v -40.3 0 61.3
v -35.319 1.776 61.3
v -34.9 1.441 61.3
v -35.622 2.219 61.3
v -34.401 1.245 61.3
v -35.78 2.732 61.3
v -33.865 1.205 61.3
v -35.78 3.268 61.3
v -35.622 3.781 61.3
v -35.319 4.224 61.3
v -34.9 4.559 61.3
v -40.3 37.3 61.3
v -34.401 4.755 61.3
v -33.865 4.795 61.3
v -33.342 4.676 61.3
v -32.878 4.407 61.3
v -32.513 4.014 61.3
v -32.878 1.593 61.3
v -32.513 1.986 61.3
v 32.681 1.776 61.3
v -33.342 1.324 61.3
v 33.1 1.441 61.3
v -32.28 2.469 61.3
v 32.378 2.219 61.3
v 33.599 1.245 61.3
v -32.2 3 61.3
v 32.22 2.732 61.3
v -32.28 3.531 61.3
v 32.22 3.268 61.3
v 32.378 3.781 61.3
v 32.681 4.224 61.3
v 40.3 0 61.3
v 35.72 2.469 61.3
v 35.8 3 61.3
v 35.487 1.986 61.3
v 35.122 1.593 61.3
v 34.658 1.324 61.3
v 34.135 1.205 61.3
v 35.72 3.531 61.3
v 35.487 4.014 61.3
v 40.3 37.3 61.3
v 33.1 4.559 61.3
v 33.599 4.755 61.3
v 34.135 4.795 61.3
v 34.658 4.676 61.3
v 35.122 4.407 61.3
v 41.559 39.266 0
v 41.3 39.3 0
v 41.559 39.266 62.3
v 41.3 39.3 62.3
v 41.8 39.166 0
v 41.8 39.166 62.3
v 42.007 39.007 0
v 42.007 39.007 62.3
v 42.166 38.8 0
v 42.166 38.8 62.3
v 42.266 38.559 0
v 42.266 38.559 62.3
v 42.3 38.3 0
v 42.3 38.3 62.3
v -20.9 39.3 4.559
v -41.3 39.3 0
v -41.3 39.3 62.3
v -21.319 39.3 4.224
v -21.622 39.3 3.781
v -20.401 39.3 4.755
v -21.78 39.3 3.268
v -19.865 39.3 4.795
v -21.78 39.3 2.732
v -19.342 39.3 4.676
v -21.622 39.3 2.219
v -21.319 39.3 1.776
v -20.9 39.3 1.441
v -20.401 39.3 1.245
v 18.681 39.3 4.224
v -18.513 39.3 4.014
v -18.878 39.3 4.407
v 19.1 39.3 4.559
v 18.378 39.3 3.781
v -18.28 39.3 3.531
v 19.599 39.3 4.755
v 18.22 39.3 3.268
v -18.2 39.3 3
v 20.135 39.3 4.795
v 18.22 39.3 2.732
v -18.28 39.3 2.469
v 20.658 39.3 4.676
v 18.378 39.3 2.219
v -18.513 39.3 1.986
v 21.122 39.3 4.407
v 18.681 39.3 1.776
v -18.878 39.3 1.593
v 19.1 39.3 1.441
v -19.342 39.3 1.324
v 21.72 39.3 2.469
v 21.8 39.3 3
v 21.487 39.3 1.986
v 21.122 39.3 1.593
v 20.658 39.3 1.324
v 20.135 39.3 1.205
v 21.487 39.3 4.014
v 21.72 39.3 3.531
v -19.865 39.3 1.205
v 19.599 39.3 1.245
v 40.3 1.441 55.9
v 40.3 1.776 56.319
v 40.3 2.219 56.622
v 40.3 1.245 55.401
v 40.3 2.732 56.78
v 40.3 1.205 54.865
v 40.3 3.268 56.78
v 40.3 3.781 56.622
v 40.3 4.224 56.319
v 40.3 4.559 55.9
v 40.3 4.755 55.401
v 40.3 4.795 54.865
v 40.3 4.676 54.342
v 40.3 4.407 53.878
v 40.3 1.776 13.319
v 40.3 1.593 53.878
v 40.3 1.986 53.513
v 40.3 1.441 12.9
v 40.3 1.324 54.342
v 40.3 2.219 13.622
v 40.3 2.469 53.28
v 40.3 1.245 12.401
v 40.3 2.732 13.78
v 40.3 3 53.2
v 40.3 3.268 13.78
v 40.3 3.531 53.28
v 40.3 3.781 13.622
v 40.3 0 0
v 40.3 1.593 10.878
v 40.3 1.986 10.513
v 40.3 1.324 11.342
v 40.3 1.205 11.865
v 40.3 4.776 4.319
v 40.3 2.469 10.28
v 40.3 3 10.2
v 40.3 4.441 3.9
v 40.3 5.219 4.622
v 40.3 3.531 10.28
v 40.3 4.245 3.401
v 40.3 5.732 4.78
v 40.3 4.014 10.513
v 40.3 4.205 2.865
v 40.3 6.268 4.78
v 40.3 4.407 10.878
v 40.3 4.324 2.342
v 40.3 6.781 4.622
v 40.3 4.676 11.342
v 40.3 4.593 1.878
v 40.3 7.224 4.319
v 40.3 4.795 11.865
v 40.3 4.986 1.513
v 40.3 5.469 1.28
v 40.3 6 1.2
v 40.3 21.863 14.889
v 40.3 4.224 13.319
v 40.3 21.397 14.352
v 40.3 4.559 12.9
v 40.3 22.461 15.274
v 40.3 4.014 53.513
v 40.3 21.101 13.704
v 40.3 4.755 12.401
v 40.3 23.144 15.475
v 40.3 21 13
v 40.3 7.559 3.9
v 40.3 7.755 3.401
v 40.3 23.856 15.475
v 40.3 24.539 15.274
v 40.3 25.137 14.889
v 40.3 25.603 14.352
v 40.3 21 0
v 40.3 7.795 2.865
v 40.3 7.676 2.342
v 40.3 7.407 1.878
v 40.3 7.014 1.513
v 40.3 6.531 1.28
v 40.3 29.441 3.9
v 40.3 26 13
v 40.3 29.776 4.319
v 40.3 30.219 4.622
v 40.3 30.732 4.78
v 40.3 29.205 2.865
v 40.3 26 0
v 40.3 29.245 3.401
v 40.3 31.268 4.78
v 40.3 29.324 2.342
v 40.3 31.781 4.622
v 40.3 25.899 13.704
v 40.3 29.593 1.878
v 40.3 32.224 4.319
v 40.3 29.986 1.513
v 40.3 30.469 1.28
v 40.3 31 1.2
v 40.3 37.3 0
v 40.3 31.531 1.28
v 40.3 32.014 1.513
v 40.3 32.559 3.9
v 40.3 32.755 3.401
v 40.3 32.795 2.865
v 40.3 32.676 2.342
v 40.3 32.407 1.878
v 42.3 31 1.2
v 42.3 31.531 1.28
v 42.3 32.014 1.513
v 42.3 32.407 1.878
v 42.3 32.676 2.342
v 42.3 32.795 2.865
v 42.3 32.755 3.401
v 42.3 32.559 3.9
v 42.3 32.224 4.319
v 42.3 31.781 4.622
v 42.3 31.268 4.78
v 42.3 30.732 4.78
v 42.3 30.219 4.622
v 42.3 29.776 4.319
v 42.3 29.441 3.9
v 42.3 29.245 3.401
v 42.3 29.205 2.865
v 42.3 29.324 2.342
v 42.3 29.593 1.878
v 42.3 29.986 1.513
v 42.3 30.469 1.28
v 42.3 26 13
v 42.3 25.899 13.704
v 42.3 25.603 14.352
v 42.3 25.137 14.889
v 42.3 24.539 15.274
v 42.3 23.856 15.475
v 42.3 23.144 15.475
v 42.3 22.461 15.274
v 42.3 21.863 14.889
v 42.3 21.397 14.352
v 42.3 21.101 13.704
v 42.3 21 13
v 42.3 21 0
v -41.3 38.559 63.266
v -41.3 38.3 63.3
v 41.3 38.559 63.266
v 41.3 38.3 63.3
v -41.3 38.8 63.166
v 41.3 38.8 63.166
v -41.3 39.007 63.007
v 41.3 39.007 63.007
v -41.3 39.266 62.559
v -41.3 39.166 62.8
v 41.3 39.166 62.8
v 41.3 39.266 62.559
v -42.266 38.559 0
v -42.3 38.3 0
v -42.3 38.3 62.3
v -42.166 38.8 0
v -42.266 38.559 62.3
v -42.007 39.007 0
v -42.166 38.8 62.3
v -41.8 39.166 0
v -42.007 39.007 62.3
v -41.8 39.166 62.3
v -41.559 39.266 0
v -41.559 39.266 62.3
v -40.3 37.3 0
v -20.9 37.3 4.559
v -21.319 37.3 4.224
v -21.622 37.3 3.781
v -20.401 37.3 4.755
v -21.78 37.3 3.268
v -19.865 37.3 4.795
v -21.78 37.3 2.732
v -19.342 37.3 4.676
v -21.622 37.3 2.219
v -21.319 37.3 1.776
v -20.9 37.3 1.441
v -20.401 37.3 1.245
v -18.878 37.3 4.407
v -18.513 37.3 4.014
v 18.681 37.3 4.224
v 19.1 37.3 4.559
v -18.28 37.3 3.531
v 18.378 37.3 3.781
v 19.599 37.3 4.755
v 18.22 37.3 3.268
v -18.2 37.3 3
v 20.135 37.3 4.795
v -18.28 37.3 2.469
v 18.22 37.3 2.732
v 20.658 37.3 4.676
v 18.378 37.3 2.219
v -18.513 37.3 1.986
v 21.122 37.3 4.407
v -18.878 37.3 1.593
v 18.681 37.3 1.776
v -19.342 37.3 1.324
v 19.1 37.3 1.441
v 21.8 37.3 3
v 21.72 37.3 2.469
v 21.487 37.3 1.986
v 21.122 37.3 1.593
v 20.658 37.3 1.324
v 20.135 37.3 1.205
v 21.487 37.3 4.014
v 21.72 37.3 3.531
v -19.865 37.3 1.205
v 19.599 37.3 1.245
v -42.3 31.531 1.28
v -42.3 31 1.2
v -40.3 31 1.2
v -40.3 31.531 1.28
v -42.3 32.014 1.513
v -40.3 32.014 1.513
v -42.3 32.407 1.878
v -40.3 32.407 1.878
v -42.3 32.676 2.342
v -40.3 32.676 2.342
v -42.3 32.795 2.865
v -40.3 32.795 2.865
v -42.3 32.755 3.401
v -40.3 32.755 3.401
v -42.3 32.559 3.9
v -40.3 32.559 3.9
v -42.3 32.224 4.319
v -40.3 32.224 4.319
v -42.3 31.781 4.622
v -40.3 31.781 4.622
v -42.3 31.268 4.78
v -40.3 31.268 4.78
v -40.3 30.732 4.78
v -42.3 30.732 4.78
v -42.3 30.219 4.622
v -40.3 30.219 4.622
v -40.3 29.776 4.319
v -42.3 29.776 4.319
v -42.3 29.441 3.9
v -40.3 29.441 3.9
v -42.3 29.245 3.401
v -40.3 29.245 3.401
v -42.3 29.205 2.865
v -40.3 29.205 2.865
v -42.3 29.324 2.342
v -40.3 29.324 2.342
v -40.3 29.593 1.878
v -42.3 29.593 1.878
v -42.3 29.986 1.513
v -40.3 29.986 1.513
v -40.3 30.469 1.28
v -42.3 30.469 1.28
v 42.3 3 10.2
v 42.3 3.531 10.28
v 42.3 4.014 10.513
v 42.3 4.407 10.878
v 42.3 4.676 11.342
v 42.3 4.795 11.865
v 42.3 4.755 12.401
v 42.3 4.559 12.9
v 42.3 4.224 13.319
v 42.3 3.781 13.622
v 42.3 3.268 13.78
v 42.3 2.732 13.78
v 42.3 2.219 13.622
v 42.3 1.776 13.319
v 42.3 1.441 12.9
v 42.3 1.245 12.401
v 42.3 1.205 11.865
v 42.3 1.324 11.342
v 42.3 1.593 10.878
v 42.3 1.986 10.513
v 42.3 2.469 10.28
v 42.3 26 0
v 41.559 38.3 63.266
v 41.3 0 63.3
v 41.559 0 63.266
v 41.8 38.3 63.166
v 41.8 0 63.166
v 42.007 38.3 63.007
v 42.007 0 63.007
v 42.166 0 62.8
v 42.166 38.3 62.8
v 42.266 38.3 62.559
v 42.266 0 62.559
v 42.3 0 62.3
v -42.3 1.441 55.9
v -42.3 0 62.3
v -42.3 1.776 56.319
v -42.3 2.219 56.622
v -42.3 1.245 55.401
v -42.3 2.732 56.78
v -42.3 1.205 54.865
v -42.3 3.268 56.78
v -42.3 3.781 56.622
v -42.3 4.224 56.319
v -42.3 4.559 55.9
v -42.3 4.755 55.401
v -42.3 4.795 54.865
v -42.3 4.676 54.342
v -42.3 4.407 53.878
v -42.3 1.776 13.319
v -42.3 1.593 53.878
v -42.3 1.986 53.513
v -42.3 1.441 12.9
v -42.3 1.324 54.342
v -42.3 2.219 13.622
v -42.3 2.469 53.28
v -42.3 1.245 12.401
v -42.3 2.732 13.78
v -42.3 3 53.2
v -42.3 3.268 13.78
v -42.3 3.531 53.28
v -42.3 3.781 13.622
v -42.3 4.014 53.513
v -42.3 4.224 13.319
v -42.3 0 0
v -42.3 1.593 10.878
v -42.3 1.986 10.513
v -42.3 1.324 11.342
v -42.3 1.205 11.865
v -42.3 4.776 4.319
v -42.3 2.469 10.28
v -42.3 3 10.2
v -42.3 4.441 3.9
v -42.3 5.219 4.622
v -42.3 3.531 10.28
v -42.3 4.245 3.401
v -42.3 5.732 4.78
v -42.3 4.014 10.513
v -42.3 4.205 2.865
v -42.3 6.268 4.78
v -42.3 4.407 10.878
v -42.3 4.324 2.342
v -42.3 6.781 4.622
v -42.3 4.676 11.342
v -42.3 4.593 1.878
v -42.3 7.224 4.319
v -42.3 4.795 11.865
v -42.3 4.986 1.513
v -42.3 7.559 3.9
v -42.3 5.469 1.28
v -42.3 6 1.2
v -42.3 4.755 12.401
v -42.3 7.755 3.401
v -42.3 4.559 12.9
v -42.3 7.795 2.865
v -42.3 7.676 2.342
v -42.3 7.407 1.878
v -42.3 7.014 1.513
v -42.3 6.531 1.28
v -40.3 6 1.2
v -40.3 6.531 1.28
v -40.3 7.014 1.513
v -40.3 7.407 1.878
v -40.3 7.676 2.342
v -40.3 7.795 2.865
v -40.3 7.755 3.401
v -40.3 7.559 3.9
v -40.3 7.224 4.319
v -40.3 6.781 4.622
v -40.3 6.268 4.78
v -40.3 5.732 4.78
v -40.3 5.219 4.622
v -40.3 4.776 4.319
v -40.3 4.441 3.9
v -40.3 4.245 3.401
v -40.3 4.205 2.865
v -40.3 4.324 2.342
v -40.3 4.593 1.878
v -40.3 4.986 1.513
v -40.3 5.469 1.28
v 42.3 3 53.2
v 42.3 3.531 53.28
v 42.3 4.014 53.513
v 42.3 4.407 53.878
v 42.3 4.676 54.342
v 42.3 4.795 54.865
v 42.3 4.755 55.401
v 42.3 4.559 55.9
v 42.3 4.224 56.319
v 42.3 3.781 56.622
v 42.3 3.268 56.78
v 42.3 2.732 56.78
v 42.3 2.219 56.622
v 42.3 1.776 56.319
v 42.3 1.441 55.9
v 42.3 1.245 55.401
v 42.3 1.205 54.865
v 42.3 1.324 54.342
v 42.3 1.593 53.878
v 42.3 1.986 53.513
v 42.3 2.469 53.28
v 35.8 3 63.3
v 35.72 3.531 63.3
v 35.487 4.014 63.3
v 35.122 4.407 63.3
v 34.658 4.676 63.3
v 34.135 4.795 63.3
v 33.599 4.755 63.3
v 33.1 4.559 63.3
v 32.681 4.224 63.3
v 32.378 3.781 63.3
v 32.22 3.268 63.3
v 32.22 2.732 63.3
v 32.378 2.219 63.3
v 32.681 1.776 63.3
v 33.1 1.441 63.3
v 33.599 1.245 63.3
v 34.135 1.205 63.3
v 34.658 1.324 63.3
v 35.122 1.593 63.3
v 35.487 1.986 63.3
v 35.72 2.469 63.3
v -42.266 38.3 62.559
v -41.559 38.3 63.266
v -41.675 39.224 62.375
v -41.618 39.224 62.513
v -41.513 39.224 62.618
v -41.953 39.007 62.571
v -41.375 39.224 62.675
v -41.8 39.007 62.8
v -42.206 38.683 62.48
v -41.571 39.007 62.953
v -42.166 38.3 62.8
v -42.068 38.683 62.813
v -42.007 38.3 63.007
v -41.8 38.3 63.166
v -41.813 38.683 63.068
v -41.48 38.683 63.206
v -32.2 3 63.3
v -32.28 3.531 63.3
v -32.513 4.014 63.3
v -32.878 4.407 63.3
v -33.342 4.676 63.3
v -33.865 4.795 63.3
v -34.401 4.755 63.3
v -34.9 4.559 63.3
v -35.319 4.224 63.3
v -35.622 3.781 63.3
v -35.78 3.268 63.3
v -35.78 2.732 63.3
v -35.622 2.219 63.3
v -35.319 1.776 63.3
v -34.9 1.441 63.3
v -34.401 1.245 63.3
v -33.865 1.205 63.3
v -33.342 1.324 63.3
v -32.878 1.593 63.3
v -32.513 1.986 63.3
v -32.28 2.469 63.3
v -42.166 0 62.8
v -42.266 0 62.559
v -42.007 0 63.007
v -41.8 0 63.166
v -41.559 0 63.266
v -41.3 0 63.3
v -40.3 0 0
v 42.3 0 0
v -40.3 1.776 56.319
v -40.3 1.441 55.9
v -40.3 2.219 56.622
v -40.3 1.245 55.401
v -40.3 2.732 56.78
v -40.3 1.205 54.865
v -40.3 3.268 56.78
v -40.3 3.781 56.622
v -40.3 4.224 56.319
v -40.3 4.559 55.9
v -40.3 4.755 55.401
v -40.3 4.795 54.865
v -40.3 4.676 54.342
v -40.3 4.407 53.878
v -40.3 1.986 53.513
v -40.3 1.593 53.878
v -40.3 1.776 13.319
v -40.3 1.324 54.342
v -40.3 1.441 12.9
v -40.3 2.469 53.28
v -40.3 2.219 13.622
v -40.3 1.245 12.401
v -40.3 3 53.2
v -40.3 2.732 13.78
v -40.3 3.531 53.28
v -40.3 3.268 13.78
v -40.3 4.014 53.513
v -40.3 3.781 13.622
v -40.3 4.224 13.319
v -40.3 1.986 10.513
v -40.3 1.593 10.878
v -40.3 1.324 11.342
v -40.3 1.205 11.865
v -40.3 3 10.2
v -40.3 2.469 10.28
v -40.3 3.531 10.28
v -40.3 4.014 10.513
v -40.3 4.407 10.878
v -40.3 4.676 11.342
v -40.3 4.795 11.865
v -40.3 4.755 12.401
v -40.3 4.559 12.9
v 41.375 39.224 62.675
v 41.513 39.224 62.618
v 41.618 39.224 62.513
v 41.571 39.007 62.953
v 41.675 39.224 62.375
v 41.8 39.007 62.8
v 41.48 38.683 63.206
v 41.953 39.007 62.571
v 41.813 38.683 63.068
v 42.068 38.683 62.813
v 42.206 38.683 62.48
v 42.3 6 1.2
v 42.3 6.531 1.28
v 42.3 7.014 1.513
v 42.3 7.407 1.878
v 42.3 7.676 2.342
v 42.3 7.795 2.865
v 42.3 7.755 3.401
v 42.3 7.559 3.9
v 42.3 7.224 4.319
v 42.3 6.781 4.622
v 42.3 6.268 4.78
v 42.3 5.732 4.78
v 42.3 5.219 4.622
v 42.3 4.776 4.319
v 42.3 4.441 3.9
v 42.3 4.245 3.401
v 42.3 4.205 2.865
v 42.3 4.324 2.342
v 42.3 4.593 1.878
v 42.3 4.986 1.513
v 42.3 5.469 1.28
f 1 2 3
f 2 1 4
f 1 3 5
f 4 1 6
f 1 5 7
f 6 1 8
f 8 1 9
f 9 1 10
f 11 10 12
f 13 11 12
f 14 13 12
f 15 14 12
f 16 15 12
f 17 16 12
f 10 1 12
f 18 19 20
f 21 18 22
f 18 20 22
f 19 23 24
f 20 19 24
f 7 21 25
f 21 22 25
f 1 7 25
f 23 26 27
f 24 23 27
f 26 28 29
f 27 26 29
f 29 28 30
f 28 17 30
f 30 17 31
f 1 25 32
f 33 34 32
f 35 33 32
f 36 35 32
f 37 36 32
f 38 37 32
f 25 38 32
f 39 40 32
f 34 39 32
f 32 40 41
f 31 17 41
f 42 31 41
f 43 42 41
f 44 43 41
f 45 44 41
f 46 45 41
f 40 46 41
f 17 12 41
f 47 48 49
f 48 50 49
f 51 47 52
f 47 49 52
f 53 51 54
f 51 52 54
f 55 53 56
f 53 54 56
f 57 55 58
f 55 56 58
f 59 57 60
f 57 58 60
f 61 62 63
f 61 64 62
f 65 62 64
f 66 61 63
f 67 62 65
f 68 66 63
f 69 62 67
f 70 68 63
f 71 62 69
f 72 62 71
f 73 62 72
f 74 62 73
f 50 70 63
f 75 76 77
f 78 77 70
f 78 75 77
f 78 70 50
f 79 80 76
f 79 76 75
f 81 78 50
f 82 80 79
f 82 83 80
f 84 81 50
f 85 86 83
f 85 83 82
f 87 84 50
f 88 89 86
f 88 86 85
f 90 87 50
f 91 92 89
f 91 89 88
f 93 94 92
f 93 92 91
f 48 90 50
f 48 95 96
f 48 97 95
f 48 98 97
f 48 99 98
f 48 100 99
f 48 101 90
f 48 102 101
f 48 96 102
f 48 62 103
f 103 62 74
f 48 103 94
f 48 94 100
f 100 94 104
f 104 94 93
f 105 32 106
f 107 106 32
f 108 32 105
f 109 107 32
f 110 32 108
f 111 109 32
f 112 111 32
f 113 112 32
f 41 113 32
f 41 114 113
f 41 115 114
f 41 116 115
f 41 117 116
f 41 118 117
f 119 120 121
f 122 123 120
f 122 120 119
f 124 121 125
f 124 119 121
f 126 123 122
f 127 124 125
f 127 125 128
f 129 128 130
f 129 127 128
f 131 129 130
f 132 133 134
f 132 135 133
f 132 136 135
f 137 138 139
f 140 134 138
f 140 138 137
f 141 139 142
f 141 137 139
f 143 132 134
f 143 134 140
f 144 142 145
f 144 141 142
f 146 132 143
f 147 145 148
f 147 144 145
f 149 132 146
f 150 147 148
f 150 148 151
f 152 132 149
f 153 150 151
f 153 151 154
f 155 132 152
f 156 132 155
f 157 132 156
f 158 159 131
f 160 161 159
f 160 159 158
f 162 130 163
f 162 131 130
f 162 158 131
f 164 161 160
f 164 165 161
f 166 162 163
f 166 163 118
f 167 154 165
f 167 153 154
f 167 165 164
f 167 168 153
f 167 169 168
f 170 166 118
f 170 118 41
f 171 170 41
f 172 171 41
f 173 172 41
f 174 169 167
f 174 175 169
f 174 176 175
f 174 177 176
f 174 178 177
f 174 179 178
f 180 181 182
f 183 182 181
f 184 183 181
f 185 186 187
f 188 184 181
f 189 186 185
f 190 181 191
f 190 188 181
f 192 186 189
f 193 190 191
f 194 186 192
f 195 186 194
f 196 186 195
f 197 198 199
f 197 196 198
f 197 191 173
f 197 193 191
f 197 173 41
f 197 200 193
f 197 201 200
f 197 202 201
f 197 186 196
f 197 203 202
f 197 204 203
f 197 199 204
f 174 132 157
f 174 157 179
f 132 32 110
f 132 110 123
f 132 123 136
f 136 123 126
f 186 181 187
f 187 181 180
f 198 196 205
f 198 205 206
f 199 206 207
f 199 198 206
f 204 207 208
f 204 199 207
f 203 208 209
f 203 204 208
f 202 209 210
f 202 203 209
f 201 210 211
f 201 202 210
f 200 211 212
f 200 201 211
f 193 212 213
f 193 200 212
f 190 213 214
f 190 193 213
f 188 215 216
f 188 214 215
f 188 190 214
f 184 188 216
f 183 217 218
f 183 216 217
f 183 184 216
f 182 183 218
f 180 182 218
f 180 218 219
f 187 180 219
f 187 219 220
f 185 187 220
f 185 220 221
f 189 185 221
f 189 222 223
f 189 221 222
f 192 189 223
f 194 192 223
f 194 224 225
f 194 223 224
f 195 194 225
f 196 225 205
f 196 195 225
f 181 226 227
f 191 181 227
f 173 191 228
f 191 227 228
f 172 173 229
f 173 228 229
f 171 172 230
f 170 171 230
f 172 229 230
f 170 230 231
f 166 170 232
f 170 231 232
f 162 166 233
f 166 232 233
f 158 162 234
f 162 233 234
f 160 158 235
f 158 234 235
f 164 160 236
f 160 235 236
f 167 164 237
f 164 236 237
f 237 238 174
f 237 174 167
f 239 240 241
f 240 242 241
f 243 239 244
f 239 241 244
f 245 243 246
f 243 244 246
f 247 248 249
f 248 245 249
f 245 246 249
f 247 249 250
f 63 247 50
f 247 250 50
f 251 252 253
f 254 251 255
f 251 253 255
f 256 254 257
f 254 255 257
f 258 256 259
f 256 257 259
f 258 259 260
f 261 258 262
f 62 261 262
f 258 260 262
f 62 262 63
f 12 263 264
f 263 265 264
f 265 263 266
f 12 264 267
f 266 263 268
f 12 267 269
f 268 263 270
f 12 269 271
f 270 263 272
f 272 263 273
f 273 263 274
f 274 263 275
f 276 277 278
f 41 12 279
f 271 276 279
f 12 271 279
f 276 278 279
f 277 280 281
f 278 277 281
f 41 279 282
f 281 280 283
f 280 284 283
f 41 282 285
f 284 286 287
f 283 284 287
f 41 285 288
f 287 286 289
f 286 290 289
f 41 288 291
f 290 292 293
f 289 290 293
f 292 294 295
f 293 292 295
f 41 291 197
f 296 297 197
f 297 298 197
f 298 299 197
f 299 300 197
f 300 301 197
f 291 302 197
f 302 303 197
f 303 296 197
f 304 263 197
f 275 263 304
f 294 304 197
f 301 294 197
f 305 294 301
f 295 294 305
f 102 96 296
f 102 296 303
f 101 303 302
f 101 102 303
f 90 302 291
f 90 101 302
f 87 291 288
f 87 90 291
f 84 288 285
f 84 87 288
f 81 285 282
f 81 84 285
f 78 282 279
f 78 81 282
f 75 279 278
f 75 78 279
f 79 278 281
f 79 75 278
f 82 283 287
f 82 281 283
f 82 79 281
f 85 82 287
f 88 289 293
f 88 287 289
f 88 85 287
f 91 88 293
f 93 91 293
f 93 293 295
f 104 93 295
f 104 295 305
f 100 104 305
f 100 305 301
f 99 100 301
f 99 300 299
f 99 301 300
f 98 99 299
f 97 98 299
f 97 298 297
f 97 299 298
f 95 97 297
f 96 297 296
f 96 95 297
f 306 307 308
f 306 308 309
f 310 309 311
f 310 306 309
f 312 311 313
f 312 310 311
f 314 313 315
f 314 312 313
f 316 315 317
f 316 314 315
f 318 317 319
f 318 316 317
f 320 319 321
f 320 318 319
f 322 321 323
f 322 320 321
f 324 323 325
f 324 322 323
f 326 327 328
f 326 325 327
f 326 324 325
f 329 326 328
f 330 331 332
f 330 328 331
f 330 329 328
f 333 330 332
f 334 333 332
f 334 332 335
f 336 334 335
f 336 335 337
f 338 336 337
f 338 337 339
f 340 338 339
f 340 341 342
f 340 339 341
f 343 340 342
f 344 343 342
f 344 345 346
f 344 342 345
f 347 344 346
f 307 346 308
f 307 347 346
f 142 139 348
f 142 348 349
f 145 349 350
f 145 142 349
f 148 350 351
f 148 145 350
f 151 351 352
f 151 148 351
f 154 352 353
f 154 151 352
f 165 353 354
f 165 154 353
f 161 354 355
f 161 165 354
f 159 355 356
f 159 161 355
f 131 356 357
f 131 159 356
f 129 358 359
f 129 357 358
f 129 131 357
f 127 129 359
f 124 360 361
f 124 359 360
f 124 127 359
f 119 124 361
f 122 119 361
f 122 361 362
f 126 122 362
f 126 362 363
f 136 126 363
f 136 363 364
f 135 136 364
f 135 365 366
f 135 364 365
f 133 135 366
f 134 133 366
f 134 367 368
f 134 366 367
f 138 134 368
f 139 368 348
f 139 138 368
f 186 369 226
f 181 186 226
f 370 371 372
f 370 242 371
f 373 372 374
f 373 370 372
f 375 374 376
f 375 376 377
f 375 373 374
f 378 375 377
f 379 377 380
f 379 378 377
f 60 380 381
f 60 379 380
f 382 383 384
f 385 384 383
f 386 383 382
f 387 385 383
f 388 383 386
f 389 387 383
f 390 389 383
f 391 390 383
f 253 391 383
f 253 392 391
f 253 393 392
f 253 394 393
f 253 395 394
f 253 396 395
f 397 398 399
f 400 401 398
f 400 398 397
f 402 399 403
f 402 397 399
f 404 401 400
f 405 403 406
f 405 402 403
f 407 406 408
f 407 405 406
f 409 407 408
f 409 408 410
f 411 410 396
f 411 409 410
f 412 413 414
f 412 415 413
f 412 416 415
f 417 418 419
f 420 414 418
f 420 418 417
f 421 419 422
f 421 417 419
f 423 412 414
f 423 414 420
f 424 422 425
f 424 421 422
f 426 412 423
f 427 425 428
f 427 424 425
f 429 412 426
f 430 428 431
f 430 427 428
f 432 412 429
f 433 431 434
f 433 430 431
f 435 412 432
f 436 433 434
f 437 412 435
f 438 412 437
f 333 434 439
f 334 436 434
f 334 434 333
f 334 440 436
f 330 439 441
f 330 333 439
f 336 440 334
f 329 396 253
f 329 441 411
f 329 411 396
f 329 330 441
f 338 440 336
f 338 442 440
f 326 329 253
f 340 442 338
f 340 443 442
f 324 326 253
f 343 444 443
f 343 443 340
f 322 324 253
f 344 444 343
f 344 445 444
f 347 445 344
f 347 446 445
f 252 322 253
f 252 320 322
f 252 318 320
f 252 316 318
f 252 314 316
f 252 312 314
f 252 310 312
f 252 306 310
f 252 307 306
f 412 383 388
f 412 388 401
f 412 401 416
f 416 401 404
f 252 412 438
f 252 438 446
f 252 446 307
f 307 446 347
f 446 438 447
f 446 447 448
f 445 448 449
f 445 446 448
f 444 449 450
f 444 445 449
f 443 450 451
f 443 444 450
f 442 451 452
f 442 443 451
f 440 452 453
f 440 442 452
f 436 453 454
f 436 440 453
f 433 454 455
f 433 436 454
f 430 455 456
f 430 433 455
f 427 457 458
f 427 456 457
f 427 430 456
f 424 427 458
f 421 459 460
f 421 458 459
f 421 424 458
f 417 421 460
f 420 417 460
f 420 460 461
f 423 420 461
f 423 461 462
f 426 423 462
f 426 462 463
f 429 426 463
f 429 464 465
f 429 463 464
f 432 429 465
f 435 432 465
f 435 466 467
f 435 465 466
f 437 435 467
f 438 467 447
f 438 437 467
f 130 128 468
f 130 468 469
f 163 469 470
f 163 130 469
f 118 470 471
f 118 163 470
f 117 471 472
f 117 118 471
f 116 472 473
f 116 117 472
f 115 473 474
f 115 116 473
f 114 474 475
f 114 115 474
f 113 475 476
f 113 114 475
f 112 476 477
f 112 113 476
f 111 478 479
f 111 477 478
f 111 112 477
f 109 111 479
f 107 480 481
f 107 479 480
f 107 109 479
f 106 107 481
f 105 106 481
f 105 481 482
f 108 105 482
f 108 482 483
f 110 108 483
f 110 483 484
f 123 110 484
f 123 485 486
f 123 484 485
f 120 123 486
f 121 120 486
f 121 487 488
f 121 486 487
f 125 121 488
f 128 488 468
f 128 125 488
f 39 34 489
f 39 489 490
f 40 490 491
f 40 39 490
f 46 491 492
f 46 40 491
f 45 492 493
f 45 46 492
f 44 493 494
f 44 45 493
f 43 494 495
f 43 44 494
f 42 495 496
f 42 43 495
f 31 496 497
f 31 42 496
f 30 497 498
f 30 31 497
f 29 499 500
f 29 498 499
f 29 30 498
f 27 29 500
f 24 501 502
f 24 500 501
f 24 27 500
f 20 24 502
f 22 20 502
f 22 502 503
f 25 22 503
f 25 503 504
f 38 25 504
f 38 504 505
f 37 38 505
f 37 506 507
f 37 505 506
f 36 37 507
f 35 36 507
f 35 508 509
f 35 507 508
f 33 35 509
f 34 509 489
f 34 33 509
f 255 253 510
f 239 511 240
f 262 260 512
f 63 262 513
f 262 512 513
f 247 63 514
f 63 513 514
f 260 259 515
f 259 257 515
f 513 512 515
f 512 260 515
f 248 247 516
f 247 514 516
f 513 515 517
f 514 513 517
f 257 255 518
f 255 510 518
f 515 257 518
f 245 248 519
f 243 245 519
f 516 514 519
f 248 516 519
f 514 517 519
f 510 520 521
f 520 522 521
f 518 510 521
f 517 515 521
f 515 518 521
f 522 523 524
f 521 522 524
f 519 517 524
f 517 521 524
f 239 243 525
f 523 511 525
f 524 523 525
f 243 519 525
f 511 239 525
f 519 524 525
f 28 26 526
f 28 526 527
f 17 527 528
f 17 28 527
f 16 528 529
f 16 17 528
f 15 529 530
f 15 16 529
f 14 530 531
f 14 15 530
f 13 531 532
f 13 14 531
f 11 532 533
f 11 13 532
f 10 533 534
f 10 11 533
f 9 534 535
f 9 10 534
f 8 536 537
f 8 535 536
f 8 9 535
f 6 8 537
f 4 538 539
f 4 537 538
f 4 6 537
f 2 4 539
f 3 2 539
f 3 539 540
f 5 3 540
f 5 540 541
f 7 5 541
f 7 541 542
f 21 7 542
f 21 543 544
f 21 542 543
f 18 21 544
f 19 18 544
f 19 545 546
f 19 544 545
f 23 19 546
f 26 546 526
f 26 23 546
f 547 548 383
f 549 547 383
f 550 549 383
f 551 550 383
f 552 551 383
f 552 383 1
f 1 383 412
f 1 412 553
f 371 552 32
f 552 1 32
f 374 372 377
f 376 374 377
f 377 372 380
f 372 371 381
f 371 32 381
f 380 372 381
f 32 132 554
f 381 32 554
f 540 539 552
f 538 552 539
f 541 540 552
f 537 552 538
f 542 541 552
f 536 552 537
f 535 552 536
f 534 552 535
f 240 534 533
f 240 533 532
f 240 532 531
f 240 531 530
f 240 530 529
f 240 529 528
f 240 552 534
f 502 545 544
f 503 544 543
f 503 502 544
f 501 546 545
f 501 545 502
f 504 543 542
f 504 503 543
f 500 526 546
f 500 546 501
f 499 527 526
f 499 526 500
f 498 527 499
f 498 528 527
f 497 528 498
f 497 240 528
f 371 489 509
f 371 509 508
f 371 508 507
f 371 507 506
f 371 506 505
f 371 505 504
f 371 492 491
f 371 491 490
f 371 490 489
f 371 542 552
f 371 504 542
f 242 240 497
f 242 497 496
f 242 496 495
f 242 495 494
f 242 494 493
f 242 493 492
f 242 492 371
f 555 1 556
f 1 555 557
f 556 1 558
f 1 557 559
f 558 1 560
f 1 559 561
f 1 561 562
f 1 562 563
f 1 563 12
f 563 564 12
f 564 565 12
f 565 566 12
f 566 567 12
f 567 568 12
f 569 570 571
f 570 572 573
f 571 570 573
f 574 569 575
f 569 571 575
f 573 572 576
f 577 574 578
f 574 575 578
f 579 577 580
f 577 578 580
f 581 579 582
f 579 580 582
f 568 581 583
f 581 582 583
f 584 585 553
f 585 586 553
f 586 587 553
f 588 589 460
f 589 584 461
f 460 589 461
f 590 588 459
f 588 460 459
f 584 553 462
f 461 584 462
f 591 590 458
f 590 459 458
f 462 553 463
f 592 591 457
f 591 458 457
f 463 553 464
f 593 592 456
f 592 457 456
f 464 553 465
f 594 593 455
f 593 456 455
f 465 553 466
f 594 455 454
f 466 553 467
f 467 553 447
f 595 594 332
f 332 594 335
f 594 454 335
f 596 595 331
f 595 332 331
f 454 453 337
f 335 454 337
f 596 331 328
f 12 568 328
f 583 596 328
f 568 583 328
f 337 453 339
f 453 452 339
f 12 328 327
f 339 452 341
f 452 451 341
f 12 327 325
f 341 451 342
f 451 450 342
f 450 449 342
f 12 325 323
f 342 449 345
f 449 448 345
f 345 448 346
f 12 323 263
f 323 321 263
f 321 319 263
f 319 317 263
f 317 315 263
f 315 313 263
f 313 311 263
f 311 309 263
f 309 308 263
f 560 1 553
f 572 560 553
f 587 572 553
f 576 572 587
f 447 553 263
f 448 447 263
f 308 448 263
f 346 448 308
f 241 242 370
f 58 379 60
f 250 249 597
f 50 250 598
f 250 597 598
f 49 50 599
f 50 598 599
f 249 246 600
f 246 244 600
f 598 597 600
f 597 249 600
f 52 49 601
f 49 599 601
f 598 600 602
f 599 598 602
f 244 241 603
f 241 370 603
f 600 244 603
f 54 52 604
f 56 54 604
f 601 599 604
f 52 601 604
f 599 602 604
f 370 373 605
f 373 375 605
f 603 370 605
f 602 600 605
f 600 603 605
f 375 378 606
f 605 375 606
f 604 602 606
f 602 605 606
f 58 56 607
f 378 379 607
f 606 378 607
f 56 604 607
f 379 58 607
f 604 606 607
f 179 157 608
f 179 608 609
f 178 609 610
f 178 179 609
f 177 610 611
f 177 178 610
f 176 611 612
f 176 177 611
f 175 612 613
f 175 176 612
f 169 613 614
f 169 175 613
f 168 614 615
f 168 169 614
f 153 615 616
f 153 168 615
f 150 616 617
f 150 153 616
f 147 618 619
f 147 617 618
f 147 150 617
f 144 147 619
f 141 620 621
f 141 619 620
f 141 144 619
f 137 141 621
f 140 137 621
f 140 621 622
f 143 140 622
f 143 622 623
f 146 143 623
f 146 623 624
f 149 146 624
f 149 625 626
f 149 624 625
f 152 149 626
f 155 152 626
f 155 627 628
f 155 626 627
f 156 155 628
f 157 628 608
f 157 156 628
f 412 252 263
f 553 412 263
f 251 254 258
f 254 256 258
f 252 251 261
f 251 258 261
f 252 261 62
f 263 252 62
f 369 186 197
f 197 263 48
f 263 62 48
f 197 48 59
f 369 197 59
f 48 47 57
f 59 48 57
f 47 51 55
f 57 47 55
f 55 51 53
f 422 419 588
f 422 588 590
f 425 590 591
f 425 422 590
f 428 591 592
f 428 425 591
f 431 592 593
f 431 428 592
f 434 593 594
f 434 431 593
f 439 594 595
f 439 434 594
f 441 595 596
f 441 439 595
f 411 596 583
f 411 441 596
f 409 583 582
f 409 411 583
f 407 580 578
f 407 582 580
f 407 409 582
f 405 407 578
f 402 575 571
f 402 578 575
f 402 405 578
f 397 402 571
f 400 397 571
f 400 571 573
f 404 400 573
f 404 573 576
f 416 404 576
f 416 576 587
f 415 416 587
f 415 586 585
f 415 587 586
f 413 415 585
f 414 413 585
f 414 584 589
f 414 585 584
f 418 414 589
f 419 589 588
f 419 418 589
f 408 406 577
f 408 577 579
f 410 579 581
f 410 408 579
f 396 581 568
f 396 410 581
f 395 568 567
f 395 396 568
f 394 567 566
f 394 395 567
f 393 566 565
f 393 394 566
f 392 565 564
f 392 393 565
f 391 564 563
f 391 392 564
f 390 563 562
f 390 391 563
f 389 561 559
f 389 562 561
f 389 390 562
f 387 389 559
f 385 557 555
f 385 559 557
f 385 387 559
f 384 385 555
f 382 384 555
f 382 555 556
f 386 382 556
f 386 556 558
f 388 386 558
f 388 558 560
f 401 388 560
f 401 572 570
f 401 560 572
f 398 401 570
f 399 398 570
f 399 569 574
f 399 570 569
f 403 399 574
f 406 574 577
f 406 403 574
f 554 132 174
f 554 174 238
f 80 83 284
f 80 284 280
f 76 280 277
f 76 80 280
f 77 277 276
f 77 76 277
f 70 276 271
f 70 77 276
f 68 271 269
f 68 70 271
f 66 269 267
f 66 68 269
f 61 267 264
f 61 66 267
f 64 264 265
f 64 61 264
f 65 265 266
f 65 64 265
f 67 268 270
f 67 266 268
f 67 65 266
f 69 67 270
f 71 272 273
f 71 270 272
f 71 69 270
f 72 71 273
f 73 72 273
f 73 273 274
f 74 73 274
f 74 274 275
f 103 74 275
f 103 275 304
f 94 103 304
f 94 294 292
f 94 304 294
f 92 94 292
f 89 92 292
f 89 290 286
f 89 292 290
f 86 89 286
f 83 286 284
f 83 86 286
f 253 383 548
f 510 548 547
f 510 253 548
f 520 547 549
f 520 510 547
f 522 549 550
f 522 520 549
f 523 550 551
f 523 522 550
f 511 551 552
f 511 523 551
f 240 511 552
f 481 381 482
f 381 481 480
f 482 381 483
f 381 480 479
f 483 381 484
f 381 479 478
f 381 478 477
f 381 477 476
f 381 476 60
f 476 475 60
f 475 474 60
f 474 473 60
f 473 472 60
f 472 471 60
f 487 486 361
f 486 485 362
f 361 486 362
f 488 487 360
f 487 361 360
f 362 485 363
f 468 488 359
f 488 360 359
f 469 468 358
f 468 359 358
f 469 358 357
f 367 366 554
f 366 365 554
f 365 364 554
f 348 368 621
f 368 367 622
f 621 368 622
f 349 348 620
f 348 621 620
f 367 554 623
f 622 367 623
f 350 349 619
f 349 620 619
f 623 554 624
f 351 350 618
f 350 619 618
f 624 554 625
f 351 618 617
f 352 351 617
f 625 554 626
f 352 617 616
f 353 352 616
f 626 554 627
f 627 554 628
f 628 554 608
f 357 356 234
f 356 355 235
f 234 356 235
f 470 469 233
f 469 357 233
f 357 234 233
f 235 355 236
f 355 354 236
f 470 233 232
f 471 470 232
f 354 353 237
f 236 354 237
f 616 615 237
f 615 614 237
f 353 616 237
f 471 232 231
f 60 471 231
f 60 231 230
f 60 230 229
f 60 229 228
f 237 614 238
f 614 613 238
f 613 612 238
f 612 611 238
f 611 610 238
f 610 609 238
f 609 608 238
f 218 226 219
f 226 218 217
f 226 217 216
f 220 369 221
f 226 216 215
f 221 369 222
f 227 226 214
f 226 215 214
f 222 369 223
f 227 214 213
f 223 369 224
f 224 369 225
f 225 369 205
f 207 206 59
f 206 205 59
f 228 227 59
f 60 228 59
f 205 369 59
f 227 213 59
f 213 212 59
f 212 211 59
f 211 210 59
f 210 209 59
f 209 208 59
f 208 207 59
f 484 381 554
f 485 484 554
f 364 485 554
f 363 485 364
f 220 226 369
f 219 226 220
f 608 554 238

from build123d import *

# Parameters (mm, degrees)
CYLINDER009_R     = 1.8
CYLINDER009_DEPTH = 16
ARRAY009_X_COUNT  = 2
ARRAY009_X_PITCH  = 40
CYLINDER010_R     = 1.8
CYLINDER010_DEPTH = 20
ARRAY010_X_COUNT  = 2
ARRAY010_X_PITCH  = 80
ARRAY010_Z_COUNT  = 2
ARRAY010_Z_PITCH  = 43
CYLINDER011_R     = 1.8
CYLINDER011_DEPTH = 10
ARRAY011_X_COUNT  = 2
ARRAY011_X_PITCH  = 68
PAD005_DEPTH      = 10
CYLINDER008_R     = 1.8
CYLINDER008_DEPTH = 20
ARRAY008_X_COUNT  = 2
ARRAY008_X_PITCH  = 80
ARRAY008_Y_COUNT  = 2
ARRAY008_Y_PITCH  = 25
BOX005_W          = 2
BOX005_H          = 37.3
BOX005_DEPTH      = 61.3
BOX007_W          = 84.6
BOX007_H          = 2
BOX007_DEPTH      = 63.3
BOX006_W          = 84.6
BOX006_H          = 37.3
BOX006_DEPTH      = 2
BOX004_W          = 2
BOX004_H          = 37.3
BOX004_DEPTH      = 61.3
FILLET_R          = 1


with BuildPart() as cover_bottom_hole_array:
    # Cylinder009 → Cylinder009 (new body)
    with BuildSketch(Plane(origin=(20, 45, 3), x_dir=(1, 0, 0), z_dir=(0, -1, 0))):
        Circle(CYLINDER009_R)
    extrude(amount=CYLINDER009_DEPTH)

    # Array009 X: cover bottom hole array ×2


with BuildPart() as cover_bottom_hole_array_1:
    add(cover_bottom_hole_array.part)
    with Locations(*[(i * ARRAY009_X_PITCH, 0, 0) for i in range(1, ARRAY009_X_COUNT)]):
        add(cover_bottom_hole_array.part)


with BuildPart() as cover_bottom_hole_array_2:
    # Array009 placement: moved
    add(cover_bottom_hole_array_1.part.moved(Location((-40, 0, 0))))


with BuildPart() as cover_side_holes_array:
    # Cylinder010 → Cylinder010 (new body)
    with BuildSketch(Plane(origin=(-50, 3, 6), x_dir=(0, 0, -1), z_dir=(1, 0, 0))):
        Circle(CYLINDER010_R)
    extrude(amount=CYLINDER010_DEPTH)

    # Array010 X: cover side holes array ×2


with BuildPart() as cover_side_holes_array_1:
    add(cover_side_holes_array.part)
    with Locations(*[(i * ARRAY010_X_PITCH, 0, 0) for i in range(1, ARRAY010_X_COUNT)]):
        add(cover_side_holes_array.part)

    # Array010 Z: cover side holes array ×2


with BuildPart() as cover_side_holes_array_2:
    add(cover_side_holes_array_1.part)
    with Locations(*[(0, 0, i * ARRAY010_Z_PITCH) for i in range(1, ARRAY010_Z_COUNT)]):
        add(cover_side_holes_array_1.part)


with BuildPart() as cover_side_holes_array_3:
    # Array010 placement: moved
    add(cover_side_holes_array_2.part.moved(Location((0, 0, 6))))


with BuildPart() as cover_vertical_hole_array:
    # Cylinder011 → Cylinder011 (new body)
    with BuildSketch(Plane(origin=(6, 0, 50), x_dir=(1, 0, 0), z_dir=(0, 0, 1))):
        Circle(CYLINDER011_R)
    extrude(amount=CYLINDER011_DEPTH)

    # Array011 X: cover vertical hole array ×2


with BuildPart() as cover_vertical_hole_array_1:
    add(cover_vertical_hole_array.part)
    with Locations(*[(i * ARRAY011_X_PITCH, 0, 0) for i in range(1, ARRAY011_X_COUNT)]):
        add(cover_vertical_hole_array.part)


with BuildPart() as cover_vertical_hole_array_2:
    # Array011 placement: moved
    add(cover_vertical_hole_array_1.part.moved(Location((-40, 3, 6))))


with BuildPart() as wire_hole_body:
    # Sketch015 → Pad005 (new body)
    with BuildSketch(Plane.YZ.offset(42.3)):
        with BuildLine():
            Line((26, 0), (26, 13))
            ThreePointArc((26, 13), (23.5, 15.5), (21, 13))
            Line((21, 0), (21, 13))
            Line((21, 0), (26, 0))
        make_face()
    extrude(amount=-PAD005_DEPTH)


with BuildPart() as cover_extraction:
    # Cylinder008 → Cylinder008 (new body)
    with BuildSketch(Plane(origin=(-50, 6, 3), x_dir=(0, 0, -1), z_dir=(1, 0, 0))):
        Circle(CYLINDER008_R)
    extrude(amount=CYLINDER008_DEPTH)

    # Array008 X: cover extraction ×2


with BuildPart() as cover_extraction_1:
    add(cover_extraction.part)
    with Locations(*[(i * ARRAY008_X_PITCH, 0, 0) for i in range(1, ARRAY008_X_COUNT)]):
        add(cover_extraction.part)

    # Array008 Y: cover extraction ×2


with BuildPart() as cover_extraction_2:
    add(cover_extraction_1.part)
    with Locations(*[(0, i * ARRAY008_Y_PITCH, 0) for i in range(1, ARRAY008_Y_COUNT)]):
        add(cover_extraction_1.part)

    # Fusion003005: union cover bottom hole array, cover side holes array, cover vertical hole array, wire hole body
    add(cover_bottom_hole_array_2.part)
    add(cover_side_holes_array_3.part)
    add(cover_vertical_hole_array_2.part)
    add(wire_hole_body.part)


with BuildPart() as another_side_wall_cube:
    # Box005 → Box005 (new body)
    with BuildSketch(Plane(origin=(40.3, 0, 0), x_dir=(1, 0, 0), z_dir=(0, 0, 1))):
        with Locations((1, 18.65)):
            Rectangle(BOX005_W, BOX005_H)
    extrude(amount=BOX005_DEPTH)


with BuildPart() as back_cover_wall_cube:
    # Box007 → Box007 (new body)
    with BuildSketch(Plane(origin=(-42.3, 37.3, 0), x_dir=(1, 0, 0), z_dir=(0, 0, 1))):
        with Locations((42.3, 1)):
            Rectangle(BOX007_W, BOX007_H)
    extrude(amount=BOX007_DEPTH)


with BuildPart() as top_cover_wall_cube:
    # Box006 → Box006 (new body)
    with BuildSketch(Plane(origin=(-42.3, 0, 61.3), x_dir=(1, 0, 0), z_dir=(0, 0, 1))):
        with Locations((42.3, 18.65)):
            Rectangle(BOX006_W, BOX006_H)
    extrude(amount=BOX006_DEPTH)


with BuildPart() as cover_body_fillet:
    # Box004 → Box004 (new body)
    with BuildSketch(Plane(origin=(-42.3, 0, 0), x_dir=(1, 0, 0), z_dir=(0, 0, 1))):
        with Locations((1, 18.65)):
            Rectangle(BOX004_W, BOX004_H)
    extrude(amount=BOX004_DEPTH)

    # Fusion003004: union another side wall cube, back cover wall cube, top cover wall cube
    add(another_side_wall_cube.part)
    add(back_cover_wall_cube.part)
    add(top_cover_wall_cube.part)

    # Cut004: cut cover extraction
    add(cover_extraction_2.part, mode=Mode.SUBTRACT)

    # Fillet
    fillet_edges = [cover_body_fillet.edges().sort_by_distance(p)[0] for p in [
        (-42.3, 18.65, 63.3),
        (-42.3, 38.3, 63.3),
        (-42.3, 39.3, 31.65),
        (42.3, 18.65, 63.3),
        (0, 39.3, 63.3),
        (42.3, 38.3, 63.3),
        (42.3, 39.3, 31.65),
    ]]
    fillet(fillet_edges, radius=FILLET_R)


solid = cover_body_fillet.part
